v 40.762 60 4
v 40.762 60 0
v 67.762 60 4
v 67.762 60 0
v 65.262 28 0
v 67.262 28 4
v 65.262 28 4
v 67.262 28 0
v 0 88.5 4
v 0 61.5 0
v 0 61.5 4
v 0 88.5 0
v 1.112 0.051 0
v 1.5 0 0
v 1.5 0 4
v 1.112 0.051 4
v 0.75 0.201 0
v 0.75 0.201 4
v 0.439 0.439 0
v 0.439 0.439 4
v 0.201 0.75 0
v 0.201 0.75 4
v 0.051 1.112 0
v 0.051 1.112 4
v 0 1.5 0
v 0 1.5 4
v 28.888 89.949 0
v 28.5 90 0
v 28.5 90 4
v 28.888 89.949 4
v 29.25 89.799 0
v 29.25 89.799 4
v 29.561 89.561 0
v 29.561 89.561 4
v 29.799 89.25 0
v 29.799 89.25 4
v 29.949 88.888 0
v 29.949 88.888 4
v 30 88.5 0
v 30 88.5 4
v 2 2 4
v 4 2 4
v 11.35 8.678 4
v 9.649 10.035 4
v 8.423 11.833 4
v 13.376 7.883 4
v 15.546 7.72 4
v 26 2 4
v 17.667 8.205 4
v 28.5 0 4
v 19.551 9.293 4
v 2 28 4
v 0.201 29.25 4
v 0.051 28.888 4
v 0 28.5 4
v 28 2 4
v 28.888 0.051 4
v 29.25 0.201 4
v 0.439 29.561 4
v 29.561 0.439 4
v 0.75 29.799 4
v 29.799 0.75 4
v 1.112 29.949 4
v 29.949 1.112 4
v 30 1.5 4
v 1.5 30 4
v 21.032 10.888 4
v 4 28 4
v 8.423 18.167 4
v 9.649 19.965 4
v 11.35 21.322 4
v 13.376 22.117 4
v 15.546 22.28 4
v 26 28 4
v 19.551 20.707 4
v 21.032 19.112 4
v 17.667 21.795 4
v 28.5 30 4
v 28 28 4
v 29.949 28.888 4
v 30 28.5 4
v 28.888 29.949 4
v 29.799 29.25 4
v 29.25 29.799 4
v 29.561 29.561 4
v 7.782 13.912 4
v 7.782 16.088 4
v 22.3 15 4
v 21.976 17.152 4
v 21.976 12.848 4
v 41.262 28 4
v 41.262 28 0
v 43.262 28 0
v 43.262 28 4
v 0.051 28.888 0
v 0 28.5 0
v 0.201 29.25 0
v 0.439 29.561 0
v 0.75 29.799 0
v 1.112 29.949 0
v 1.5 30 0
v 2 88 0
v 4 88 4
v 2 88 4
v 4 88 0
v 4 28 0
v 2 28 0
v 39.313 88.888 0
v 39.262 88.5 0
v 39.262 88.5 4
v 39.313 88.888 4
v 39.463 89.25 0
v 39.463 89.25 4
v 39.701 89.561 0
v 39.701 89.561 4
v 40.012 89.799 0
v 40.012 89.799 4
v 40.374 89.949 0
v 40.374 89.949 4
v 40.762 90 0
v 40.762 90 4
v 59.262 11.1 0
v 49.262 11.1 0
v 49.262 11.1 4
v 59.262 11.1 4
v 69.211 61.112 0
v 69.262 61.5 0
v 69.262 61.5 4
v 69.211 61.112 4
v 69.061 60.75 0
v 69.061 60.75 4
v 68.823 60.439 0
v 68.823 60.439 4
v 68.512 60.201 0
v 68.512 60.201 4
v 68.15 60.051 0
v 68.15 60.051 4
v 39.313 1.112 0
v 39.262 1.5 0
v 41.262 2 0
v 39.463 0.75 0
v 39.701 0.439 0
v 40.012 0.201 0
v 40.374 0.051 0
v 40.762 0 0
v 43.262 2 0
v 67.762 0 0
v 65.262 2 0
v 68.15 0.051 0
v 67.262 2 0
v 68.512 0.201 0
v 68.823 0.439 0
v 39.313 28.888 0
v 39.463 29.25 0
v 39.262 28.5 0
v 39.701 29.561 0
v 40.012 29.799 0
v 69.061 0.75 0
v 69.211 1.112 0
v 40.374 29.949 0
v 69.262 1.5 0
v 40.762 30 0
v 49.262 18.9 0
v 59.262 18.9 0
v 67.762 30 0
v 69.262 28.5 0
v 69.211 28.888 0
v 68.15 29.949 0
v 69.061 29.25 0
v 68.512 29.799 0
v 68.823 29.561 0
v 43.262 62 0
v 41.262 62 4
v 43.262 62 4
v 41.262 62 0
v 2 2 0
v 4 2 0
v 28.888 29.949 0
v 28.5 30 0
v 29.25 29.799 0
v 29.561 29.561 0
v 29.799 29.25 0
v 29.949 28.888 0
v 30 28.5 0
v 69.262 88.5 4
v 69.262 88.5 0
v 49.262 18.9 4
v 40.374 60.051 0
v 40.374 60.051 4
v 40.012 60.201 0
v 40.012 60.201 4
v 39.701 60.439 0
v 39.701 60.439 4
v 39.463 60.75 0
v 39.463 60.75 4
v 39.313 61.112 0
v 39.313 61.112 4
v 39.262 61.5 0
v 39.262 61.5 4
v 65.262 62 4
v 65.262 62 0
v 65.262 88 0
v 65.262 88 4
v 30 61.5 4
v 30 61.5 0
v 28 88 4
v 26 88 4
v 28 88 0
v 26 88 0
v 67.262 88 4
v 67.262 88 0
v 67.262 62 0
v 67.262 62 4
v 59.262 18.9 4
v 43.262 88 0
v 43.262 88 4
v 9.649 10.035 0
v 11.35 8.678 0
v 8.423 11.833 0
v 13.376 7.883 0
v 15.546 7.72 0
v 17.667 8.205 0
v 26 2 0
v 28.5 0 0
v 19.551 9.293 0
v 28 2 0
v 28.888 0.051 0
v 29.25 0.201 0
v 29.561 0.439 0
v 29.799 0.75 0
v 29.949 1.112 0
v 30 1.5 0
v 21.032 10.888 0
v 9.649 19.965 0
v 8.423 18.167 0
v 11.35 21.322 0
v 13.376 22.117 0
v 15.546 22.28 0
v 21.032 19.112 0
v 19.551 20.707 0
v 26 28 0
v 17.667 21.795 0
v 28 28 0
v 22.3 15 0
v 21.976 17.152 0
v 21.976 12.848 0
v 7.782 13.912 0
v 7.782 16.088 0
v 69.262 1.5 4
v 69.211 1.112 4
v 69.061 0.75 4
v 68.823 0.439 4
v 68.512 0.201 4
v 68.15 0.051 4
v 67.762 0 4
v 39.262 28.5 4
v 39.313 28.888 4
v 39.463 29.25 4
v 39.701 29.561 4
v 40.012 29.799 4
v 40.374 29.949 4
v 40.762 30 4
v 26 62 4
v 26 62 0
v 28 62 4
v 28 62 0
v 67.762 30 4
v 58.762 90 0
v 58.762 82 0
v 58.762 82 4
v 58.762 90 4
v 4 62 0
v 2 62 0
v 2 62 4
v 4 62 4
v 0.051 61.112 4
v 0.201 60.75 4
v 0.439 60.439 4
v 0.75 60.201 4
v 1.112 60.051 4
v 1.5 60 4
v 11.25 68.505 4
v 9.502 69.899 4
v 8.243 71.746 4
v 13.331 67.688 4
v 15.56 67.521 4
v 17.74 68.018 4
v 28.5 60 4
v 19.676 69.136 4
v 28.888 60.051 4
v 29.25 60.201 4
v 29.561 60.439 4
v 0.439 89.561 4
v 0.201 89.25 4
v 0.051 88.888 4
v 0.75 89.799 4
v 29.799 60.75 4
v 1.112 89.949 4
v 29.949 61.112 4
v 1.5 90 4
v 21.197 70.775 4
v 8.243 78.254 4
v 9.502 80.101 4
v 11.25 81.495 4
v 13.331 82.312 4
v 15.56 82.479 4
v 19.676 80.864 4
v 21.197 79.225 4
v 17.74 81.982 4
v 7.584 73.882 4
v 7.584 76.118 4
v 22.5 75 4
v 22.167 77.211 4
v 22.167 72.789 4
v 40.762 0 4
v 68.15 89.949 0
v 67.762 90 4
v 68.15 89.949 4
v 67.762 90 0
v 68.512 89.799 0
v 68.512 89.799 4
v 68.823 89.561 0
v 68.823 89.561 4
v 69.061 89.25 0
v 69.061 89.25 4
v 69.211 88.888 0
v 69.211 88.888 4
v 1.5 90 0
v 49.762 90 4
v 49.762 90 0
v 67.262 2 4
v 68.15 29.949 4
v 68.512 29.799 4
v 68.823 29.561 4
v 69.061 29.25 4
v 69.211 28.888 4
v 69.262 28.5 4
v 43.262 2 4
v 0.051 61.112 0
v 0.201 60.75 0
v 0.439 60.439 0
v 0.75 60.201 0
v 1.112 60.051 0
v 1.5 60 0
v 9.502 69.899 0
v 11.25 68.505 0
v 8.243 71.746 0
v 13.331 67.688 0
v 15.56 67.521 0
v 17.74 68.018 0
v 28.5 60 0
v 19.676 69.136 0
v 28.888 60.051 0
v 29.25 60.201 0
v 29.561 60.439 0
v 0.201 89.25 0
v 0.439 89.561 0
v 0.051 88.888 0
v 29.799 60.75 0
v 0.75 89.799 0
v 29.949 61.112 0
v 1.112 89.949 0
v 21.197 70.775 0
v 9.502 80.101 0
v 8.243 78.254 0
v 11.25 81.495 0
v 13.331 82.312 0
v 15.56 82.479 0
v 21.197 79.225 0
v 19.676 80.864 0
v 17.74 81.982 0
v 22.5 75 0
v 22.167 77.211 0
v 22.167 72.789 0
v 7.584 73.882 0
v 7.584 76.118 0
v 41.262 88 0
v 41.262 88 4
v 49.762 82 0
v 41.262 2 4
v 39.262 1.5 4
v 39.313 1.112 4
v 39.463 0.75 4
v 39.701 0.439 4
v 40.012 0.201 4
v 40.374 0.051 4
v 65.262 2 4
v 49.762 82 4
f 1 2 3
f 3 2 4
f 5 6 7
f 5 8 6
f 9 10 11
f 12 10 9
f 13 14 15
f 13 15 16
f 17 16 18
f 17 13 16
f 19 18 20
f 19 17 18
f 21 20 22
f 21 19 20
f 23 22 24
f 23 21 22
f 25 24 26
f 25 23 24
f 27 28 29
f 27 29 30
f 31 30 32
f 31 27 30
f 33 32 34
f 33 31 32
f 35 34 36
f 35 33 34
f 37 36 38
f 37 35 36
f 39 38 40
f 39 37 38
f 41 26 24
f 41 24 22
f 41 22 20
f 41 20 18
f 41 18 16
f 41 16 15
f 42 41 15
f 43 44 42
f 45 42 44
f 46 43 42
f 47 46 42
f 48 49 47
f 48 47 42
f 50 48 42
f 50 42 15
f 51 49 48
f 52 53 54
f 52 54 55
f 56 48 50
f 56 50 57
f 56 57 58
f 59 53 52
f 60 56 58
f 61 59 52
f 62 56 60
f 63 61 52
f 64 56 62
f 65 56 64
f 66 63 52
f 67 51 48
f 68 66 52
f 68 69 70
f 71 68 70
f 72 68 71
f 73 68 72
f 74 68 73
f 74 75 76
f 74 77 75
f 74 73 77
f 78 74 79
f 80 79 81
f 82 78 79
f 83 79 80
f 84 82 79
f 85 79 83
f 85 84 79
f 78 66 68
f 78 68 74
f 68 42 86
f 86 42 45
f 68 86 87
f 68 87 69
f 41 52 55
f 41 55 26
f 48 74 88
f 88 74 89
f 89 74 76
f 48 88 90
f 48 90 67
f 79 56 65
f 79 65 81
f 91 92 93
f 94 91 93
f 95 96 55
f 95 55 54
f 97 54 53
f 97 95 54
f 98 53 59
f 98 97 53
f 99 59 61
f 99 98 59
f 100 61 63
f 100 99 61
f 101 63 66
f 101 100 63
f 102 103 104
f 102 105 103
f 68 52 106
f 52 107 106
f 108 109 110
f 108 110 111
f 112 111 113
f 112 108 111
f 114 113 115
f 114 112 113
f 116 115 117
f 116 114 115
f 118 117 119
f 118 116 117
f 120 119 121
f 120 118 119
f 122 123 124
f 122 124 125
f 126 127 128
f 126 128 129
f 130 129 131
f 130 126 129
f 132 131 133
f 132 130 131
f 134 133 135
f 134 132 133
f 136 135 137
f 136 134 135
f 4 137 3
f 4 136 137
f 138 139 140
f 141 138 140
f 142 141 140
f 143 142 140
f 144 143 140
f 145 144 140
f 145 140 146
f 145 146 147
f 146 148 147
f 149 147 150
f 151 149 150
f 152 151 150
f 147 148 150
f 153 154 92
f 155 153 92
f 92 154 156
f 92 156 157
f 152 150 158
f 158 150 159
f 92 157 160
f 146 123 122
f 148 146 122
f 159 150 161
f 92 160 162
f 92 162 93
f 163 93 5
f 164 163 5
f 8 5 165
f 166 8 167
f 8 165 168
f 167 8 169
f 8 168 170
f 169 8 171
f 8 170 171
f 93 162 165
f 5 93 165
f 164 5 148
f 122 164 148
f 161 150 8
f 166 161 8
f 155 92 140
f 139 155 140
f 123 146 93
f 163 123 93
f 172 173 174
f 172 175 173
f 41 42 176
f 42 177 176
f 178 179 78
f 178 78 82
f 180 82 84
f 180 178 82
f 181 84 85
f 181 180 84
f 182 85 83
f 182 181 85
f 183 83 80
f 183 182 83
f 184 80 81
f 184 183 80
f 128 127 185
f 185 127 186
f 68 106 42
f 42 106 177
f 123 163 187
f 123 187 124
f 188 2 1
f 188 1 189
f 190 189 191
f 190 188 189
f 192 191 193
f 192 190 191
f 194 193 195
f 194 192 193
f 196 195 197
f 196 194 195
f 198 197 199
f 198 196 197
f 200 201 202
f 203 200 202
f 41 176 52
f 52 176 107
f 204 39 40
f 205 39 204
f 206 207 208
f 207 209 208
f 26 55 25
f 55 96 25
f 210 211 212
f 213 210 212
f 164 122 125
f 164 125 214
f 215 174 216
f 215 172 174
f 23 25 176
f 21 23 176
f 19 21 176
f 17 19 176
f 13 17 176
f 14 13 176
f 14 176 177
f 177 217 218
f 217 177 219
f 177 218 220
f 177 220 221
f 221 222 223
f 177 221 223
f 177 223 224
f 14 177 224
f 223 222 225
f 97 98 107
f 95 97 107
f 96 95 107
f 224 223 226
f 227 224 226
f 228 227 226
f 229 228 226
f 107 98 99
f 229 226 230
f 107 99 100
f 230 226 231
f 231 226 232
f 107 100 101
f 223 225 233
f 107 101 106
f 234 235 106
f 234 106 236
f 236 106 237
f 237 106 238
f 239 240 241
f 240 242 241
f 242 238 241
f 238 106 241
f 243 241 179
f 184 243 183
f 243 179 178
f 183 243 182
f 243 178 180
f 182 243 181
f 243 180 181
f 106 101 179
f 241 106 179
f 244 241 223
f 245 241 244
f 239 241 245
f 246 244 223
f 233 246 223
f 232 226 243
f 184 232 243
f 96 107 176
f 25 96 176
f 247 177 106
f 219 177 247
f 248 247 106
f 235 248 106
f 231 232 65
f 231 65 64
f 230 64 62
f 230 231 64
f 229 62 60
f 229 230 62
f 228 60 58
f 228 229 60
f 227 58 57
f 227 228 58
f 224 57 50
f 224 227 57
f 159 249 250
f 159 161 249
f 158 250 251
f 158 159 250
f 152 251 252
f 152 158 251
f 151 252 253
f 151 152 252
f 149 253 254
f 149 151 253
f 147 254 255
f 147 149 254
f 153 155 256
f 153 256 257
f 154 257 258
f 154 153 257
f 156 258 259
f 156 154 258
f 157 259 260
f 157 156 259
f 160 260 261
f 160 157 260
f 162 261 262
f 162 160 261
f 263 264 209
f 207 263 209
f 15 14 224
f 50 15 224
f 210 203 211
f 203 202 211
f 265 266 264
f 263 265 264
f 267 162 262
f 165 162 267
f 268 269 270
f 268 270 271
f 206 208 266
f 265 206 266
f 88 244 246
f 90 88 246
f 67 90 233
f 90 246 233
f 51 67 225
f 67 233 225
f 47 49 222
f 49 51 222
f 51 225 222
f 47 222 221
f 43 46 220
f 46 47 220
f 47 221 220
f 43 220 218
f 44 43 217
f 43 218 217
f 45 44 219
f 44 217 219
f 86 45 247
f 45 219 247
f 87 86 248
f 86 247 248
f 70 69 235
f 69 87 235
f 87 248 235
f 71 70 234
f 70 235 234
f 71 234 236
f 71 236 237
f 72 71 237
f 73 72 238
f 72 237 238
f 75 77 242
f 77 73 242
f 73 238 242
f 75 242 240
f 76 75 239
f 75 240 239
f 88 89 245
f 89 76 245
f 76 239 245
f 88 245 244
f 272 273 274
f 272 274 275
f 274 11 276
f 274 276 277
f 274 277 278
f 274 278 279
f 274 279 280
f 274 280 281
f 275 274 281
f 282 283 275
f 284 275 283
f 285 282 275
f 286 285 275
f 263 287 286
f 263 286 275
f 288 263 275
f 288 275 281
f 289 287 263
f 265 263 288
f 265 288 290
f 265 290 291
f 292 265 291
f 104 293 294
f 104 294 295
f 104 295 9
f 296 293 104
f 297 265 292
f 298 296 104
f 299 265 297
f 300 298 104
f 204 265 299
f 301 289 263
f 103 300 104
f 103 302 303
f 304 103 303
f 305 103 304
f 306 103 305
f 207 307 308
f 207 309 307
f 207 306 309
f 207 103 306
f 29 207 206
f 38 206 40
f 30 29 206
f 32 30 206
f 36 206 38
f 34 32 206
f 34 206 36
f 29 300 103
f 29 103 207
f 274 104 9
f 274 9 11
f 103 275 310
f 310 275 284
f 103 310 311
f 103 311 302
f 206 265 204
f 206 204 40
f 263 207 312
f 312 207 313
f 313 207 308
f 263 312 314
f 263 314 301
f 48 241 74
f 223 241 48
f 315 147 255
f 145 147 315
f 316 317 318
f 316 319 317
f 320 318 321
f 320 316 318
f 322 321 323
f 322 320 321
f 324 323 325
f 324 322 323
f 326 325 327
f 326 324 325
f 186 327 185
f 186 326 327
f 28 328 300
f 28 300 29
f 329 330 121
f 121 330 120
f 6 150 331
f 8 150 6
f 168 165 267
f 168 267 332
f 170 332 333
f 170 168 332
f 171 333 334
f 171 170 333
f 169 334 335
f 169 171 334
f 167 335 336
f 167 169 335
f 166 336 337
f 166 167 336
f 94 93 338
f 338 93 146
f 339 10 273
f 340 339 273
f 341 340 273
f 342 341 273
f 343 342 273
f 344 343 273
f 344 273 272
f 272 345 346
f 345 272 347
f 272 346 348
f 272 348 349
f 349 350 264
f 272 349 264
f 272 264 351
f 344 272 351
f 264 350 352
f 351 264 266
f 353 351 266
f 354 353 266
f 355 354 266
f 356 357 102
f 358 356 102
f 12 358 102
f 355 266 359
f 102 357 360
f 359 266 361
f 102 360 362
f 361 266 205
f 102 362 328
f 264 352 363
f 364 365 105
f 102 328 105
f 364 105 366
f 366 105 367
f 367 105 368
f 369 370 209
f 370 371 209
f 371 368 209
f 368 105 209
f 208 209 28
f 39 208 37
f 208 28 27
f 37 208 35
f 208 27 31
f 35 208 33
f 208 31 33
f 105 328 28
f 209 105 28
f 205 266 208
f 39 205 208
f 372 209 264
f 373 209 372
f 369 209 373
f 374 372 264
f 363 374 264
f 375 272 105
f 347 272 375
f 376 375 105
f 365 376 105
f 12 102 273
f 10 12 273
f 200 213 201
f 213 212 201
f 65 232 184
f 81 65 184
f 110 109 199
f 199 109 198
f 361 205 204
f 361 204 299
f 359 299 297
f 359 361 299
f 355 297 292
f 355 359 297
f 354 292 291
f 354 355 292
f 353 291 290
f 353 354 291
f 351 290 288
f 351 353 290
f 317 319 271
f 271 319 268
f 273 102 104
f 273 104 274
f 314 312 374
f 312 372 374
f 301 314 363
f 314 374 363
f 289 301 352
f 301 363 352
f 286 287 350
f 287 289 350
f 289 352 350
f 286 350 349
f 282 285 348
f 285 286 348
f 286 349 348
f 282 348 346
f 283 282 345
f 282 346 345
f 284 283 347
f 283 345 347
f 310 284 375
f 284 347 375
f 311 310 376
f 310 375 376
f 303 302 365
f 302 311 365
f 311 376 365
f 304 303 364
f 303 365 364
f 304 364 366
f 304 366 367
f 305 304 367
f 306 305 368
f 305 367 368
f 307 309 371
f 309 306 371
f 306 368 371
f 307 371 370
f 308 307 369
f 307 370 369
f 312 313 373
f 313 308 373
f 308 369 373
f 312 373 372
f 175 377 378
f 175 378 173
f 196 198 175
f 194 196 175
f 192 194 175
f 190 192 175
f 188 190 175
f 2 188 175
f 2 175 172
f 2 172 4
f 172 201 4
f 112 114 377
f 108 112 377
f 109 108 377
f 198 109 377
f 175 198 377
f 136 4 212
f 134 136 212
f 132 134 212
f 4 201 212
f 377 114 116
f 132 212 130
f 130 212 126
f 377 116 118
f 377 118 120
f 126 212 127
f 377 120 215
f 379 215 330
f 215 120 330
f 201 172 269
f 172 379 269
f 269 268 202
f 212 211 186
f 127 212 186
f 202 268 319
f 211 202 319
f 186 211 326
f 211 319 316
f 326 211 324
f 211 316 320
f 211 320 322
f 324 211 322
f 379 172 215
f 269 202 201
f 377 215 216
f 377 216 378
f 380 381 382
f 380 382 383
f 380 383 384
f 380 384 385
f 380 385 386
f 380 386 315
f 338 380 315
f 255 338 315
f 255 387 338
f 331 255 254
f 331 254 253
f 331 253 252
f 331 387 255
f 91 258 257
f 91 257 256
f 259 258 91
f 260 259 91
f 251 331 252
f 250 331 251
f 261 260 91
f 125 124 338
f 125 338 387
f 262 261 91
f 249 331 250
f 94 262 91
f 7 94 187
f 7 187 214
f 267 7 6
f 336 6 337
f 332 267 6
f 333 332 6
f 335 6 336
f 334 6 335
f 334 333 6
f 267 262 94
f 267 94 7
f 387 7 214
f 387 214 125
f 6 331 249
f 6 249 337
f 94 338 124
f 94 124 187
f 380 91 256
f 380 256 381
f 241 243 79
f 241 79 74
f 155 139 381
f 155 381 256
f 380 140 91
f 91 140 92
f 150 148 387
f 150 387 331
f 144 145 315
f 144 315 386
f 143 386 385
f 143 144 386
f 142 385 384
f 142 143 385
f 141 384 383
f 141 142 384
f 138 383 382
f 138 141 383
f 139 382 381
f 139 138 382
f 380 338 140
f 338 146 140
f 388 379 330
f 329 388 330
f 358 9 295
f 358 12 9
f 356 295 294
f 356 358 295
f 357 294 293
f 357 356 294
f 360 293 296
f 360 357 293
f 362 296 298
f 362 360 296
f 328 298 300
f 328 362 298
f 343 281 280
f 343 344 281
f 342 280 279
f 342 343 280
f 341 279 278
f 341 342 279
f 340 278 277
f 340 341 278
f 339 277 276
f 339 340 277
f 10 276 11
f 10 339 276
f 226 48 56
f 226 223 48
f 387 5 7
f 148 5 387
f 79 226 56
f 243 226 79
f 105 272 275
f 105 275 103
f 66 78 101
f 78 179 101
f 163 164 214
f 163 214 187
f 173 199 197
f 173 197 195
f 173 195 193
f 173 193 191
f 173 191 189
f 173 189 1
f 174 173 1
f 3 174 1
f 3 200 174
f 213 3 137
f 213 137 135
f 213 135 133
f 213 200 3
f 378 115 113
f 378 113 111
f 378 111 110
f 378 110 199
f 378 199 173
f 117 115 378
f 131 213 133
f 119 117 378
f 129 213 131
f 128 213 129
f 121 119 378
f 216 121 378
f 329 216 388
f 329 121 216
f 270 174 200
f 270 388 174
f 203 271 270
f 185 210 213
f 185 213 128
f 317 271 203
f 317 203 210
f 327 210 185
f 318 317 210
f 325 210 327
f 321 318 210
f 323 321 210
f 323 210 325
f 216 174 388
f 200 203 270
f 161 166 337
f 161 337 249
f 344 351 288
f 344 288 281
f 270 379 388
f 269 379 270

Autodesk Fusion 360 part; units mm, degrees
ref_plane "WorkPlane1" through (0, 0, 0) normal (0, 0, 1) x (1, 0, 0)
sketch "Sketch1" plane through (0, 0, 0) normal (0, 0, 1) x (1, 0, 0)
  line L0 (1.5, 0) -> (28.5, 0)
  line L1 (30, 1.5) -> (30, 28.5)
  line L2 (28.5, 30) -> (1.5, 30)
  line L3 (0, 28.5) -> (0, 1.5)
  arc A0 (30, 28.5) -> (28.5, 30) centre (28.5, 28.5) ccw
  arc A1 (1.5, 30) -> (0, 28.5) centre (1.5, 28.5) ccw
  arc A2 (0, 1.5) -> (1.5, 0) centre (1.5, 1.5) ccw
  arc A3 (28.5, 0) -> (30, 1.5) centre (28.5, 1.5) ccw
  line L4 (15, 0) -> (15, 30) construction
  line L5 (34.631, -0.4878) -> (34.631, 26.5001) construction
  line L6 (30, 15) -> (0, 15) construction
  arc A4 (40.762, 30) -> (39.262, 28.5) centre (40.762, 28.5) ccw
  line L7 (40.762, 30) -> (67.762, 30)
  arc A5 (69.262, 28.5) -> (67.762, 30) centre (67.762, 28.5) ccw
  line L8 (69.262, 28.5) -> (69.262, 1.5)
  arc A6 (67.762, 0) -> (69.262, 1.5) centre (67.762, 1.5) ccw
  line L9 (67.762, 0) -> (40.762, 0)
  arc A7 (39.262, 1.5) -> (40.762, 0) centre (40.762, 1.5) ccw
  line L10 (39.262, 1.5) -> (39.262, 28.5)
  line L11 (39.262, 15) -> (69.262, 15) construction
  line L12 (54.262, 0) -> (54.262, 30) construction
  line L13 (4, 2) -> (2, 2)
  line L14 (2, 2) -> (2, 28)
  line L15 (2, 28) -> (4, 28)
  line L16 (4, 28) -> (4, 2)
  line L17 (28, 28) -> (26, 28)
  line L18 (26, 28) -> (26, 2)
  line L19 (28, 2) -> (28, 28)
  line L20 (26, 2) -> (28, 2)
  line L21 (67.262, 28) -> (65.262, 28)
  line L22 (65.262, 28) -> (65.262, 2)
  line L23 (67.262, 2) -> (67.262, 28)
  line L24 (65.262, 2) -> (67.262, 2)
  line L25 (43.262, 28) -> (43.262, 2)
  line L26 (41.262, 2) -> (41.262, 28)
  line L27 (43.262, 2) -> (41.262, 2)
  line L28 (41.262, 28) -> (43.262, 28)
  line L29 (0, 45) -> (70, 45) construction
  line L30 (67.262, 62) -> (65.262, 62)
  line L31 (43.262, 62) -> (43.262, 88)
  line L32 (28, 88) -> (28, 62)
  arc A8 (28.5, 60) -> (30, 61.5) centre (28.5, 61.5) ccw
  line L33 (34.631, 90.4878) -> (34.631, 63.4999) construction
  line L34 (4, 88) -> (2, 88)
  line L35 (15, 90) -> (15, 60) construction
  line L36 (39.262, 75) -> (69.262, 75) construction
  arc A9 (40.762, 90) -> (39.262, 88.5) centre (40.762, 88.5) ccw
  arc A10 (30, 88.5) -> (28.5, 90) centre (28.5, 88.5) ccw
  arc A11 (67.762, 60) -> (69.262, 61.5) centre (67.762, 61.5) ccw
  line L37 (0, 61.5) -> (0, 88.5)
  line L38 (30, 88.5) -> (30, 61.5)
  line L39 (1.5, 90) -> (28.5, 90)
  arc A12 (1.5, 90) -> (0, 88.5) centre (1.5, 88.5) ccw
  line L40 (4, 62) -> (4, 88)
  line L41 (28, 62) -> (26, 62)
  arc A13 (39.262, 61.5) -> (40.762, 60) centre (40.762, 61.5) ccw
  line L42 (65.262, 88) -> (67.262, 88)
  line L43 (26, 88) -> (28, 88)
  line L44 (65.262, 62) -> (65.262, 88)
  line L45 (41.262, 62) -> (43.262, 62)
  line L46 (67.262, 88) -> (67.262, 62)
  line L47 (2, 88) -> (2, 62)
  line L48 (2, 62) -> (4, 62)
  line L49 (67.762, 90) -> (40.762, 90)
  line L50 (69.262, 61.5) -> (69.262, 88.5)
  arc A14 (0, 61.5) -> (1.5, 60) centre (1.5, 61.5) ccw
  line L51 (40.762, 60) -> (67.762, 60)
  line L52 (41.262, 88) -> (41.262, 62)
  line L53 (28.5, 60) -> (1.5, 60)
  line L54 (30, 75) -> (0, 75) construction
  line L55 (54.262, 90) -> (54.262, 60) construction
  line L56 (43.262, 88) -> (41.262, 88)
  arc A15 (69.262, 88.5) -> (67.762, 90) centre (67.762, 88.5) ccw
  line L57 (26, 62) -> (26, 88)
  line L58 (39.262, 88.5) -> (39.262, 61.5)
  circle A16 centre (15, 15) radius 7.3
  circle A17 centre (15, 75) radius 7.5
  line L59 (59.262, 18.9) -> (49.262, 18.9)
  line L60 (49.262, 18.9) -> (49.262, 11.1)
  line L61 (49.262, 11.1) -> (59.262, 11.1)
  line L62 (59.262, 11.1) -> (59.262, 18.9)
  line L63 (59.262, 18.9) -> (49.262, 11.1) construction
  line L64 (49.262, 18.9) -> (59.262, 11.1) construction
  line L65 (49.762, 82) -> (58.762, 82)
  line L66 (15, 82.5) -> (61.4441, 82.5) construction
  line L67 (49.762, 82) -> (49.762, 90)
  line L68 (58.762, 82) -> (58.762, 90)
  line L69 (58.762, 90) -> (49.762, 90)
  point P0 (30, 0)
  point P1 (0, 30)
  point P2 (0, 90)
  point P3 (0, 60)
  point P4 (30, 90)
  point P5 (0, 90)
  point P6 (54.262, 15)
  dimension "d9" = 30
  dimension "d10" = 30
  dimension "d18" = 1.5
  dimension "d19" = 1.5
  dimension "d20" = 1.5
  dimension "d21" = 1.5
  dimension "d41" = 2
  dimension "d42" = 2
  dimension "d43" = 2
  dimension "d44" = 2
  dimension "d45" = 14.6
  dimension "d46" = 15
  dimension "d54" = 10
  dimension "d55" = 7.8
  dimension "d57" = 9
extrude "Extrude4" add sketch "Sketch1" along normal blind 4 contours L0 L1 L2 L3 A0 A1 A2 A3 | A4 L7 A5 L8 A6 L9 A7 L10 | A8 A10 L37 L38 L39 A12 A14 L53 | A9 A11 A13 L49 L50 L51 A15 L58 L65 L67 L68 makes body 1 at (14.8182, 26.0932, 0) makes body 2 at (15.1868, 63.8403, 0) makes body 3 at (52.5953, 5.0333, 0) makes body 4 at (55.762, 68.6667, 0)
sketch "speaker_top" plane through (0, 0, 4) normal (0, 0, 1) x (-1, 0, 0)
  circle A0 centre (-15, -75) radius 7.5
  line L0 (-28, -62) -> (-26, -62)
  line L1 (-26, -62) -> (-26, -88)
  line L2 (-26, -88) -> (-28, -88)
  line L3 (-28, -88) -> (-28, -62)
  line L4 (-4, -62) -> (-2, -62)
  line L5 (-2, -62) -> (-2, -88)
  line L6 (-2, -88) -> (-4, -88)
  line L7 (-4, -88) -> (-4, -62)
  arc A1 (-30, -88.5) -> (-28.5, -90) centre (-28.5, -88.5) ccw
  line L8 (-28.5, -90) -> (-1.5, -90)
  arc A2 (-1.5, -90) -> (0, -88.5) centre (-1.5, -88.5) ccw
  line L9 (0, -88.5) -> (0, -61.5)
  arc A3 (0, -61.5) -> (-1.5, -60) centre (-1.5, -61.5) ccw
  line L10 (-1.5, -60) -> (-28.5, -60)
  arc A4 (-28.5, -60) -> (-30, -61.5) centre (-28.5, -61.5) ccw
  line L11 (-30, -61.5) -> (-30, -88.5)
sketch "speaker_bottom" plane through (0, 0, 4) normal (0, 0, 1) x (-1, 0, 0)
  line L0 (-41.262, -88) -> (-43.262, -88)
  line L1 (-43.262, -88) -> (-43.262, -62)
  line L2 (-43.262, -62) -> (-41.262, -62)
  line L3 (-41.262, -62) -> (-41.262, -88)
  line L4 (-65.262, -88) -> (-67.262, -88)
  line L5 (-67.262, -88) -> (-67.262, -62)
  line L6 (-67.262, -62) -> (-65.262, -62)
  line L7 (-65.262, -62) -> (-65.262, -88)
  line L8 (-49.762, -82) -> (-49.762, -90)
  line L9 (-49.762, -90) -> (-40.762, -90)
  arc A0 (-40.762, -90) -> (-39.262, -88.5) centre (-40.762, -88.5) ccw
  line L10 (-39.262, -88.5) -> (-39.262, -61.5)
  arc A1 (-39.262, -61.5) -> (-40.762, -60) centre (-40.762, -61.5) ccw
  line L11 (-40.762, -60) -> (-67.762, -60)
  arc A2 (-67.762, -60) -> (-69.262, -61.5) centre (-67.762, -61.5) ccw
  line L12 (-69.262, -61.5) -> (-69.262, -88.5)
  arc A3 (-69.262, -88.5) -> (-67.762, -90) centre (-67.762, -88.5) ccw
  line L13 (-67.762, -90) -> (-58.762, -90)
  line L14 (-58.762, -90) -> (-58.762, -82)
  line L15 (-58.762, -82) -> (-49.762, -82)
sketch "mic_top" plane through (0, 0, 4) normal (0, 0, 1) x (-1, 0, 0)
  circle A0 centre (-15, -15) radius 7.3
  line L0 (-28, -2) -> (-26, -2)
  line L1 (-26, -2) -> (-26, -28)
  line L2 (-26, -28) -> (-28, -28)
  line L3 (-28, -28) -> (-28, -2)
  line L4 (-2, -28) -> (-4, -28)
  line L5 (-4, -28) -> (-4, -2)
  line L6 (-4, -2) -> (-2, -2)
  line L7 (-2, -2) -> (-2, -28)
  arc A1 (-28.5, 0) -> (-30, -1.5) centre (-28.5, -1.5) ccw
  line L8 (-30, -1.5) -> (-30, -28.5)
  arc A2 (-30, -28.5) -> (-28.5, -30) centre (-28.5, -28.5) ccw
  line L9 (-28.5, -30) -> (-1.5, -30)
  arc A3 (-1.5, -30) -> (0, -28.5) centre (-1.5, -28.5) ccw
  line L10 (0, -28.5) -> (0, -1.5)
  arc A4 (0, -1.5) -> (-1.5, 0) centre (-1.5, -1.5) ccw
  line L11 (-1.5, 0) -> (-28.5, 0)
sketch "mic_bottom" plane through (0, 0, 4) normal (0, 0, 1) x (-1, 0, 0)
  line L0 (-67.262, -2) -> (-65.262, -2)
  line L1 (-65.262, -2) -> (-65.262, -28)
  line L2 (-65.262, -28) -> (-67.262, -28)
  line L3 (-67.262, -28) -> (-67.262, -2)
  line L4 (-41.262, -2) -> (-41.262, -28)
  line L5 (-41.262, -28) -> (-43.262, -28)
  line L6 (-43.262, -28) -> (-43.262, -2)
  line L7 (-43.262, -2) -> (-41.262, -2)
  line L8 (-59.262, -18.9) -> (-59.262, -11.1)
  line L9 (-59.262, -11.1) -> (-49.262, -11.1)
  line L10 (-49.262, -11.1) -> (-49.262, -18.9)
  line L11 (-49.262, -18.9) -> (-59.262, -18.9)
  arc A0 (-67.762, 0) -> (-69.262, -1.5) centre (-67.762, -1.5) ccw
  line L12 (-69.262, -1.5) -> (-69.262, -28.5)
  arc A1 (-69.262, -28.5) -> (-67.762, -30) centre (-67.762, -28.5) ccw
  line L13 (-67.762, -30) -> (-40.762, -30)
  arc A2 (-40.762, -30) -> (-39.262, -28.5) centre (-40.762, -28.5) ccw
  line L14 (-39.262, -28.5) -> (-39.262, -1.5)
  arc A3 (-39.262, -1.5) -> (-40.762, 0) centre (-40.762, -1.5) ccw
  line L15 (-40.762, 0) -> (-67.762, 0)
equation "microphone_diameter = 14.6 mm"
equation "speaker_diameter = 15 mm"
equation "object_length = 30 mm"
equation "object_height = 4 mm"
equation "tolerance_to_object = 2 mm"
equation "strap_height = 25 mm"
equation "strap_width = 2 mm"
equation "d9 = object_length"
equation "d10 = object_length"
equation "d41 = tolerance_to_object"
equation "d42 = tolerance_to_object"
equation "d43 = strap_width"
equation "d44 = tolerance_to_object"
equation "d45 = microphone_diameter"
equation "d46 = speaker_diameter"
equation "speaker_connector_distance = 9 mm"
equation "mic_connector_distance = 10 mm"
equation "d54 = mic_connector_distance"
equation "d55 = mic_pin_length"
equation "mic_pin_length = 7.8 mm"
equation "d57 = speaker_connector_distance"
equation "d60 = object_height"
